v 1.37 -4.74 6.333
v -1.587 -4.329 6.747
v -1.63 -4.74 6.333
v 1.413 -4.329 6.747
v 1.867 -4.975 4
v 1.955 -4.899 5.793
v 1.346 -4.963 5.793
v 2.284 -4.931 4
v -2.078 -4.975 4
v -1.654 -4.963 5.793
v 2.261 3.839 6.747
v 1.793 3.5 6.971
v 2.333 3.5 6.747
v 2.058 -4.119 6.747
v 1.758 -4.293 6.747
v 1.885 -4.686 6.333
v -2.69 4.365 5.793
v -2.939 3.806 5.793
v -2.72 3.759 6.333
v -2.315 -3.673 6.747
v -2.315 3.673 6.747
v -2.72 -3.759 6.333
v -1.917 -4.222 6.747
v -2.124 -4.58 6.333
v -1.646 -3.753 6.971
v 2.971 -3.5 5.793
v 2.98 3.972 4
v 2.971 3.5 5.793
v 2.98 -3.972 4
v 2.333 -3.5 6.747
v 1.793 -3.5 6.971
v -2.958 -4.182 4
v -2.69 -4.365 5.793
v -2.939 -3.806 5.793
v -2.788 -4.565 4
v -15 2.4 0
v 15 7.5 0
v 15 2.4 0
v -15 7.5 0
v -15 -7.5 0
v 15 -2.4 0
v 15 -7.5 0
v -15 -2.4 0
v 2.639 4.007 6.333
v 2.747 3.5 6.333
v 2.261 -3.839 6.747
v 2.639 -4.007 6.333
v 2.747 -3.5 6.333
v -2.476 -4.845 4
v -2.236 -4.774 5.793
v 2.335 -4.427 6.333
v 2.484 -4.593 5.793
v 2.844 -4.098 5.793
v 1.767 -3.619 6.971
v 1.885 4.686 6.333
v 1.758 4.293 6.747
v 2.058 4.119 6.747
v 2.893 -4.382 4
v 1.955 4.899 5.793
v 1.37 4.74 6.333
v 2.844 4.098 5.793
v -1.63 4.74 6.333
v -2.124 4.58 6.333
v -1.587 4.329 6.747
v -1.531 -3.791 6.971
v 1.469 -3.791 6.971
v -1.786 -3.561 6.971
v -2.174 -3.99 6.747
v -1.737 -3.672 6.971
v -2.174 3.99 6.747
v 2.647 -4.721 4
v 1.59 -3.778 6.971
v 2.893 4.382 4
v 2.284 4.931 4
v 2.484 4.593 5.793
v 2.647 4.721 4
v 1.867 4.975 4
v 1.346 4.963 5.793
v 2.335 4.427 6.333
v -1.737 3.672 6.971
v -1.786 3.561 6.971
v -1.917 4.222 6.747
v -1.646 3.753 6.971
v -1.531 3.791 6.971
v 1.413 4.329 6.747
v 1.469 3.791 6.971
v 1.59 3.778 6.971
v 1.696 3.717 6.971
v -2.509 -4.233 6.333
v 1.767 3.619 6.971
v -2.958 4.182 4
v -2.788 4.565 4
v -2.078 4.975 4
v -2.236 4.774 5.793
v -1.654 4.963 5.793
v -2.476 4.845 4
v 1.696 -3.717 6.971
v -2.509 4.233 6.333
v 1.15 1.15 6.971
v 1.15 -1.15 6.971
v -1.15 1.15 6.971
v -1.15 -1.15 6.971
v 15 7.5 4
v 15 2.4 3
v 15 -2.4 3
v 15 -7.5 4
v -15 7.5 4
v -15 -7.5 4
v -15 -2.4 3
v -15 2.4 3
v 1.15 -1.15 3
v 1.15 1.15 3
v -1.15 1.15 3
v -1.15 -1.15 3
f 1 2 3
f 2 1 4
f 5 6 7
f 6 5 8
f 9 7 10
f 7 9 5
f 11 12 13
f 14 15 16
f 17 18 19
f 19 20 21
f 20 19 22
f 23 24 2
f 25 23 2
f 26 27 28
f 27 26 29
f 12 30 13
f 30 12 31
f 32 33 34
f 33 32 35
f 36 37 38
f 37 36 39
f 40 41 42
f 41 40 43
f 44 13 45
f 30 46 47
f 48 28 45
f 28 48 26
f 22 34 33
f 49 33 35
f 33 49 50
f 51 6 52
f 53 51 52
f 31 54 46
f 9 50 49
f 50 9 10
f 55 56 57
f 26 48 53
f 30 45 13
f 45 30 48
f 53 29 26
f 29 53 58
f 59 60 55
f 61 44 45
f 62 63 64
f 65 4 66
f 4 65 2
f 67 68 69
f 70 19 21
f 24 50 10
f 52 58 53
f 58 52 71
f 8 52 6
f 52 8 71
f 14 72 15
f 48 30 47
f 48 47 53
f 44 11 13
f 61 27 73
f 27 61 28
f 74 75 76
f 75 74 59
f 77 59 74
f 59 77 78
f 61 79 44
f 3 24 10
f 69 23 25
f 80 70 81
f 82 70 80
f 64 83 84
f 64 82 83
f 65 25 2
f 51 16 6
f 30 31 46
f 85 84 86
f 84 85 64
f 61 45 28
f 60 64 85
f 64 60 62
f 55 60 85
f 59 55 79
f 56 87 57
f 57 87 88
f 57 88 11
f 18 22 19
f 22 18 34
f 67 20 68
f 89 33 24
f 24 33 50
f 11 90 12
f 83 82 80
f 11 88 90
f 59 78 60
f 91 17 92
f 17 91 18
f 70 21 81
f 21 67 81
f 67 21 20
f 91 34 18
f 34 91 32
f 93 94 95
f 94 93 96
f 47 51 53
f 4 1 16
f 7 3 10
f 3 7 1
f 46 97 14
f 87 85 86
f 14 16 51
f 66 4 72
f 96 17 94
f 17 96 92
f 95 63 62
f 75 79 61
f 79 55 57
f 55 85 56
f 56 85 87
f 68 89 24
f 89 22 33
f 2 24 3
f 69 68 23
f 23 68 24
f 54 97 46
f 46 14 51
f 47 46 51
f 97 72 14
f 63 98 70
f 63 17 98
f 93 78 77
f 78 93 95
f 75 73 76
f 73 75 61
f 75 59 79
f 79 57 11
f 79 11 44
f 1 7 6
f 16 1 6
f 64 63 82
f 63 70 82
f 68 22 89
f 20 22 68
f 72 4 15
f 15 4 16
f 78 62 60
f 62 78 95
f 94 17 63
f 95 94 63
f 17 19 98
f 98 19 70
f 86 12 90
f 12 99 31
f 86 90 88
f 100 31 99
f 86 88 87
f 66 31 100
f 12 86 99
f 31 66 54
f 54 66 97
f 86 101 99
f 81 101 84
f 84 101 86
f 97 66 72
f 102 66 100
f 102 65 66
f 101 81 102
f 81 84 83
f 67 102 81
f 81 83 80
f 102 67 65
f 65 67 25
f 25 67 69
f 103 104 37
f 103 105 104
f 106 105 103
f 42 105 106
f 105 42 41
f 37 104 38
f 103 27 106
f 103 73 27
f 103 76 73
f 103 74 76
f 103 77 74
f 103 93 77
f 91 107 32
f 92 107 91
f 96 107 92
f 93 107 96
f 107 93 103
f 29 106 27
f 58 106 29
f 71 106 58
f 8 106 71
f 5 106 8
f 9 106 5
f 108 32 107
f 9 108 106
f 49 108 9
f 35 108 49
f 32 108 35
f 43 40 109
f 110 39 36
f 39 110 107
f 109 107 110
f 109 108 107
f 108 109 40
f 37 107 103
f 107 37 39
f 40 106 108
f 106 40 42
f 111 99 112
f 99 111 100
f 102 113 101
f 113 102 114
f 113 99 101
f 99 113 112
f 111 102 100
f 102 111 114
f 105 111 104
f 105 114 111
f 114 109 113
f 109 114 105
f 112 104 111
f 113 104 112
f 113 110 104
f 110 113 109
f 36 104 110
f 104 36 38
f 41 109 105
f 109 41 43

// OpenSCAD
// bouton dessous

difference()
{
    union()
    {
        translate([-3,-5,0]) cuber([6,10,4+3],1.5);
        translate([-15,-7.5,0]) cube([30,15,4]);
    }
    translate([-2.3/2,-2.3/2,0]) cube([2.3,2.3,4+3.8]);
    
    // rainure
    translate([-15,-4.8/2,0]) cube([30,4.8,3]);
}

module cuber(dim,r)
{
    hull()
    {
        cube([dim.x,dim.y,.1]);
        translate([r,r,dim.z-r]) sphere(r,$fn=15);
        translate([dim.x-r,r,dim.z-r]) sphere(r,$fn=15);
        translate([r,dim.y-r,dim.z-r]) sphere(r,$fn=15);
        translate([dim.x-r,dim.y-r,dim.z-r]) sphere(r,$fn=15);
    }
}
